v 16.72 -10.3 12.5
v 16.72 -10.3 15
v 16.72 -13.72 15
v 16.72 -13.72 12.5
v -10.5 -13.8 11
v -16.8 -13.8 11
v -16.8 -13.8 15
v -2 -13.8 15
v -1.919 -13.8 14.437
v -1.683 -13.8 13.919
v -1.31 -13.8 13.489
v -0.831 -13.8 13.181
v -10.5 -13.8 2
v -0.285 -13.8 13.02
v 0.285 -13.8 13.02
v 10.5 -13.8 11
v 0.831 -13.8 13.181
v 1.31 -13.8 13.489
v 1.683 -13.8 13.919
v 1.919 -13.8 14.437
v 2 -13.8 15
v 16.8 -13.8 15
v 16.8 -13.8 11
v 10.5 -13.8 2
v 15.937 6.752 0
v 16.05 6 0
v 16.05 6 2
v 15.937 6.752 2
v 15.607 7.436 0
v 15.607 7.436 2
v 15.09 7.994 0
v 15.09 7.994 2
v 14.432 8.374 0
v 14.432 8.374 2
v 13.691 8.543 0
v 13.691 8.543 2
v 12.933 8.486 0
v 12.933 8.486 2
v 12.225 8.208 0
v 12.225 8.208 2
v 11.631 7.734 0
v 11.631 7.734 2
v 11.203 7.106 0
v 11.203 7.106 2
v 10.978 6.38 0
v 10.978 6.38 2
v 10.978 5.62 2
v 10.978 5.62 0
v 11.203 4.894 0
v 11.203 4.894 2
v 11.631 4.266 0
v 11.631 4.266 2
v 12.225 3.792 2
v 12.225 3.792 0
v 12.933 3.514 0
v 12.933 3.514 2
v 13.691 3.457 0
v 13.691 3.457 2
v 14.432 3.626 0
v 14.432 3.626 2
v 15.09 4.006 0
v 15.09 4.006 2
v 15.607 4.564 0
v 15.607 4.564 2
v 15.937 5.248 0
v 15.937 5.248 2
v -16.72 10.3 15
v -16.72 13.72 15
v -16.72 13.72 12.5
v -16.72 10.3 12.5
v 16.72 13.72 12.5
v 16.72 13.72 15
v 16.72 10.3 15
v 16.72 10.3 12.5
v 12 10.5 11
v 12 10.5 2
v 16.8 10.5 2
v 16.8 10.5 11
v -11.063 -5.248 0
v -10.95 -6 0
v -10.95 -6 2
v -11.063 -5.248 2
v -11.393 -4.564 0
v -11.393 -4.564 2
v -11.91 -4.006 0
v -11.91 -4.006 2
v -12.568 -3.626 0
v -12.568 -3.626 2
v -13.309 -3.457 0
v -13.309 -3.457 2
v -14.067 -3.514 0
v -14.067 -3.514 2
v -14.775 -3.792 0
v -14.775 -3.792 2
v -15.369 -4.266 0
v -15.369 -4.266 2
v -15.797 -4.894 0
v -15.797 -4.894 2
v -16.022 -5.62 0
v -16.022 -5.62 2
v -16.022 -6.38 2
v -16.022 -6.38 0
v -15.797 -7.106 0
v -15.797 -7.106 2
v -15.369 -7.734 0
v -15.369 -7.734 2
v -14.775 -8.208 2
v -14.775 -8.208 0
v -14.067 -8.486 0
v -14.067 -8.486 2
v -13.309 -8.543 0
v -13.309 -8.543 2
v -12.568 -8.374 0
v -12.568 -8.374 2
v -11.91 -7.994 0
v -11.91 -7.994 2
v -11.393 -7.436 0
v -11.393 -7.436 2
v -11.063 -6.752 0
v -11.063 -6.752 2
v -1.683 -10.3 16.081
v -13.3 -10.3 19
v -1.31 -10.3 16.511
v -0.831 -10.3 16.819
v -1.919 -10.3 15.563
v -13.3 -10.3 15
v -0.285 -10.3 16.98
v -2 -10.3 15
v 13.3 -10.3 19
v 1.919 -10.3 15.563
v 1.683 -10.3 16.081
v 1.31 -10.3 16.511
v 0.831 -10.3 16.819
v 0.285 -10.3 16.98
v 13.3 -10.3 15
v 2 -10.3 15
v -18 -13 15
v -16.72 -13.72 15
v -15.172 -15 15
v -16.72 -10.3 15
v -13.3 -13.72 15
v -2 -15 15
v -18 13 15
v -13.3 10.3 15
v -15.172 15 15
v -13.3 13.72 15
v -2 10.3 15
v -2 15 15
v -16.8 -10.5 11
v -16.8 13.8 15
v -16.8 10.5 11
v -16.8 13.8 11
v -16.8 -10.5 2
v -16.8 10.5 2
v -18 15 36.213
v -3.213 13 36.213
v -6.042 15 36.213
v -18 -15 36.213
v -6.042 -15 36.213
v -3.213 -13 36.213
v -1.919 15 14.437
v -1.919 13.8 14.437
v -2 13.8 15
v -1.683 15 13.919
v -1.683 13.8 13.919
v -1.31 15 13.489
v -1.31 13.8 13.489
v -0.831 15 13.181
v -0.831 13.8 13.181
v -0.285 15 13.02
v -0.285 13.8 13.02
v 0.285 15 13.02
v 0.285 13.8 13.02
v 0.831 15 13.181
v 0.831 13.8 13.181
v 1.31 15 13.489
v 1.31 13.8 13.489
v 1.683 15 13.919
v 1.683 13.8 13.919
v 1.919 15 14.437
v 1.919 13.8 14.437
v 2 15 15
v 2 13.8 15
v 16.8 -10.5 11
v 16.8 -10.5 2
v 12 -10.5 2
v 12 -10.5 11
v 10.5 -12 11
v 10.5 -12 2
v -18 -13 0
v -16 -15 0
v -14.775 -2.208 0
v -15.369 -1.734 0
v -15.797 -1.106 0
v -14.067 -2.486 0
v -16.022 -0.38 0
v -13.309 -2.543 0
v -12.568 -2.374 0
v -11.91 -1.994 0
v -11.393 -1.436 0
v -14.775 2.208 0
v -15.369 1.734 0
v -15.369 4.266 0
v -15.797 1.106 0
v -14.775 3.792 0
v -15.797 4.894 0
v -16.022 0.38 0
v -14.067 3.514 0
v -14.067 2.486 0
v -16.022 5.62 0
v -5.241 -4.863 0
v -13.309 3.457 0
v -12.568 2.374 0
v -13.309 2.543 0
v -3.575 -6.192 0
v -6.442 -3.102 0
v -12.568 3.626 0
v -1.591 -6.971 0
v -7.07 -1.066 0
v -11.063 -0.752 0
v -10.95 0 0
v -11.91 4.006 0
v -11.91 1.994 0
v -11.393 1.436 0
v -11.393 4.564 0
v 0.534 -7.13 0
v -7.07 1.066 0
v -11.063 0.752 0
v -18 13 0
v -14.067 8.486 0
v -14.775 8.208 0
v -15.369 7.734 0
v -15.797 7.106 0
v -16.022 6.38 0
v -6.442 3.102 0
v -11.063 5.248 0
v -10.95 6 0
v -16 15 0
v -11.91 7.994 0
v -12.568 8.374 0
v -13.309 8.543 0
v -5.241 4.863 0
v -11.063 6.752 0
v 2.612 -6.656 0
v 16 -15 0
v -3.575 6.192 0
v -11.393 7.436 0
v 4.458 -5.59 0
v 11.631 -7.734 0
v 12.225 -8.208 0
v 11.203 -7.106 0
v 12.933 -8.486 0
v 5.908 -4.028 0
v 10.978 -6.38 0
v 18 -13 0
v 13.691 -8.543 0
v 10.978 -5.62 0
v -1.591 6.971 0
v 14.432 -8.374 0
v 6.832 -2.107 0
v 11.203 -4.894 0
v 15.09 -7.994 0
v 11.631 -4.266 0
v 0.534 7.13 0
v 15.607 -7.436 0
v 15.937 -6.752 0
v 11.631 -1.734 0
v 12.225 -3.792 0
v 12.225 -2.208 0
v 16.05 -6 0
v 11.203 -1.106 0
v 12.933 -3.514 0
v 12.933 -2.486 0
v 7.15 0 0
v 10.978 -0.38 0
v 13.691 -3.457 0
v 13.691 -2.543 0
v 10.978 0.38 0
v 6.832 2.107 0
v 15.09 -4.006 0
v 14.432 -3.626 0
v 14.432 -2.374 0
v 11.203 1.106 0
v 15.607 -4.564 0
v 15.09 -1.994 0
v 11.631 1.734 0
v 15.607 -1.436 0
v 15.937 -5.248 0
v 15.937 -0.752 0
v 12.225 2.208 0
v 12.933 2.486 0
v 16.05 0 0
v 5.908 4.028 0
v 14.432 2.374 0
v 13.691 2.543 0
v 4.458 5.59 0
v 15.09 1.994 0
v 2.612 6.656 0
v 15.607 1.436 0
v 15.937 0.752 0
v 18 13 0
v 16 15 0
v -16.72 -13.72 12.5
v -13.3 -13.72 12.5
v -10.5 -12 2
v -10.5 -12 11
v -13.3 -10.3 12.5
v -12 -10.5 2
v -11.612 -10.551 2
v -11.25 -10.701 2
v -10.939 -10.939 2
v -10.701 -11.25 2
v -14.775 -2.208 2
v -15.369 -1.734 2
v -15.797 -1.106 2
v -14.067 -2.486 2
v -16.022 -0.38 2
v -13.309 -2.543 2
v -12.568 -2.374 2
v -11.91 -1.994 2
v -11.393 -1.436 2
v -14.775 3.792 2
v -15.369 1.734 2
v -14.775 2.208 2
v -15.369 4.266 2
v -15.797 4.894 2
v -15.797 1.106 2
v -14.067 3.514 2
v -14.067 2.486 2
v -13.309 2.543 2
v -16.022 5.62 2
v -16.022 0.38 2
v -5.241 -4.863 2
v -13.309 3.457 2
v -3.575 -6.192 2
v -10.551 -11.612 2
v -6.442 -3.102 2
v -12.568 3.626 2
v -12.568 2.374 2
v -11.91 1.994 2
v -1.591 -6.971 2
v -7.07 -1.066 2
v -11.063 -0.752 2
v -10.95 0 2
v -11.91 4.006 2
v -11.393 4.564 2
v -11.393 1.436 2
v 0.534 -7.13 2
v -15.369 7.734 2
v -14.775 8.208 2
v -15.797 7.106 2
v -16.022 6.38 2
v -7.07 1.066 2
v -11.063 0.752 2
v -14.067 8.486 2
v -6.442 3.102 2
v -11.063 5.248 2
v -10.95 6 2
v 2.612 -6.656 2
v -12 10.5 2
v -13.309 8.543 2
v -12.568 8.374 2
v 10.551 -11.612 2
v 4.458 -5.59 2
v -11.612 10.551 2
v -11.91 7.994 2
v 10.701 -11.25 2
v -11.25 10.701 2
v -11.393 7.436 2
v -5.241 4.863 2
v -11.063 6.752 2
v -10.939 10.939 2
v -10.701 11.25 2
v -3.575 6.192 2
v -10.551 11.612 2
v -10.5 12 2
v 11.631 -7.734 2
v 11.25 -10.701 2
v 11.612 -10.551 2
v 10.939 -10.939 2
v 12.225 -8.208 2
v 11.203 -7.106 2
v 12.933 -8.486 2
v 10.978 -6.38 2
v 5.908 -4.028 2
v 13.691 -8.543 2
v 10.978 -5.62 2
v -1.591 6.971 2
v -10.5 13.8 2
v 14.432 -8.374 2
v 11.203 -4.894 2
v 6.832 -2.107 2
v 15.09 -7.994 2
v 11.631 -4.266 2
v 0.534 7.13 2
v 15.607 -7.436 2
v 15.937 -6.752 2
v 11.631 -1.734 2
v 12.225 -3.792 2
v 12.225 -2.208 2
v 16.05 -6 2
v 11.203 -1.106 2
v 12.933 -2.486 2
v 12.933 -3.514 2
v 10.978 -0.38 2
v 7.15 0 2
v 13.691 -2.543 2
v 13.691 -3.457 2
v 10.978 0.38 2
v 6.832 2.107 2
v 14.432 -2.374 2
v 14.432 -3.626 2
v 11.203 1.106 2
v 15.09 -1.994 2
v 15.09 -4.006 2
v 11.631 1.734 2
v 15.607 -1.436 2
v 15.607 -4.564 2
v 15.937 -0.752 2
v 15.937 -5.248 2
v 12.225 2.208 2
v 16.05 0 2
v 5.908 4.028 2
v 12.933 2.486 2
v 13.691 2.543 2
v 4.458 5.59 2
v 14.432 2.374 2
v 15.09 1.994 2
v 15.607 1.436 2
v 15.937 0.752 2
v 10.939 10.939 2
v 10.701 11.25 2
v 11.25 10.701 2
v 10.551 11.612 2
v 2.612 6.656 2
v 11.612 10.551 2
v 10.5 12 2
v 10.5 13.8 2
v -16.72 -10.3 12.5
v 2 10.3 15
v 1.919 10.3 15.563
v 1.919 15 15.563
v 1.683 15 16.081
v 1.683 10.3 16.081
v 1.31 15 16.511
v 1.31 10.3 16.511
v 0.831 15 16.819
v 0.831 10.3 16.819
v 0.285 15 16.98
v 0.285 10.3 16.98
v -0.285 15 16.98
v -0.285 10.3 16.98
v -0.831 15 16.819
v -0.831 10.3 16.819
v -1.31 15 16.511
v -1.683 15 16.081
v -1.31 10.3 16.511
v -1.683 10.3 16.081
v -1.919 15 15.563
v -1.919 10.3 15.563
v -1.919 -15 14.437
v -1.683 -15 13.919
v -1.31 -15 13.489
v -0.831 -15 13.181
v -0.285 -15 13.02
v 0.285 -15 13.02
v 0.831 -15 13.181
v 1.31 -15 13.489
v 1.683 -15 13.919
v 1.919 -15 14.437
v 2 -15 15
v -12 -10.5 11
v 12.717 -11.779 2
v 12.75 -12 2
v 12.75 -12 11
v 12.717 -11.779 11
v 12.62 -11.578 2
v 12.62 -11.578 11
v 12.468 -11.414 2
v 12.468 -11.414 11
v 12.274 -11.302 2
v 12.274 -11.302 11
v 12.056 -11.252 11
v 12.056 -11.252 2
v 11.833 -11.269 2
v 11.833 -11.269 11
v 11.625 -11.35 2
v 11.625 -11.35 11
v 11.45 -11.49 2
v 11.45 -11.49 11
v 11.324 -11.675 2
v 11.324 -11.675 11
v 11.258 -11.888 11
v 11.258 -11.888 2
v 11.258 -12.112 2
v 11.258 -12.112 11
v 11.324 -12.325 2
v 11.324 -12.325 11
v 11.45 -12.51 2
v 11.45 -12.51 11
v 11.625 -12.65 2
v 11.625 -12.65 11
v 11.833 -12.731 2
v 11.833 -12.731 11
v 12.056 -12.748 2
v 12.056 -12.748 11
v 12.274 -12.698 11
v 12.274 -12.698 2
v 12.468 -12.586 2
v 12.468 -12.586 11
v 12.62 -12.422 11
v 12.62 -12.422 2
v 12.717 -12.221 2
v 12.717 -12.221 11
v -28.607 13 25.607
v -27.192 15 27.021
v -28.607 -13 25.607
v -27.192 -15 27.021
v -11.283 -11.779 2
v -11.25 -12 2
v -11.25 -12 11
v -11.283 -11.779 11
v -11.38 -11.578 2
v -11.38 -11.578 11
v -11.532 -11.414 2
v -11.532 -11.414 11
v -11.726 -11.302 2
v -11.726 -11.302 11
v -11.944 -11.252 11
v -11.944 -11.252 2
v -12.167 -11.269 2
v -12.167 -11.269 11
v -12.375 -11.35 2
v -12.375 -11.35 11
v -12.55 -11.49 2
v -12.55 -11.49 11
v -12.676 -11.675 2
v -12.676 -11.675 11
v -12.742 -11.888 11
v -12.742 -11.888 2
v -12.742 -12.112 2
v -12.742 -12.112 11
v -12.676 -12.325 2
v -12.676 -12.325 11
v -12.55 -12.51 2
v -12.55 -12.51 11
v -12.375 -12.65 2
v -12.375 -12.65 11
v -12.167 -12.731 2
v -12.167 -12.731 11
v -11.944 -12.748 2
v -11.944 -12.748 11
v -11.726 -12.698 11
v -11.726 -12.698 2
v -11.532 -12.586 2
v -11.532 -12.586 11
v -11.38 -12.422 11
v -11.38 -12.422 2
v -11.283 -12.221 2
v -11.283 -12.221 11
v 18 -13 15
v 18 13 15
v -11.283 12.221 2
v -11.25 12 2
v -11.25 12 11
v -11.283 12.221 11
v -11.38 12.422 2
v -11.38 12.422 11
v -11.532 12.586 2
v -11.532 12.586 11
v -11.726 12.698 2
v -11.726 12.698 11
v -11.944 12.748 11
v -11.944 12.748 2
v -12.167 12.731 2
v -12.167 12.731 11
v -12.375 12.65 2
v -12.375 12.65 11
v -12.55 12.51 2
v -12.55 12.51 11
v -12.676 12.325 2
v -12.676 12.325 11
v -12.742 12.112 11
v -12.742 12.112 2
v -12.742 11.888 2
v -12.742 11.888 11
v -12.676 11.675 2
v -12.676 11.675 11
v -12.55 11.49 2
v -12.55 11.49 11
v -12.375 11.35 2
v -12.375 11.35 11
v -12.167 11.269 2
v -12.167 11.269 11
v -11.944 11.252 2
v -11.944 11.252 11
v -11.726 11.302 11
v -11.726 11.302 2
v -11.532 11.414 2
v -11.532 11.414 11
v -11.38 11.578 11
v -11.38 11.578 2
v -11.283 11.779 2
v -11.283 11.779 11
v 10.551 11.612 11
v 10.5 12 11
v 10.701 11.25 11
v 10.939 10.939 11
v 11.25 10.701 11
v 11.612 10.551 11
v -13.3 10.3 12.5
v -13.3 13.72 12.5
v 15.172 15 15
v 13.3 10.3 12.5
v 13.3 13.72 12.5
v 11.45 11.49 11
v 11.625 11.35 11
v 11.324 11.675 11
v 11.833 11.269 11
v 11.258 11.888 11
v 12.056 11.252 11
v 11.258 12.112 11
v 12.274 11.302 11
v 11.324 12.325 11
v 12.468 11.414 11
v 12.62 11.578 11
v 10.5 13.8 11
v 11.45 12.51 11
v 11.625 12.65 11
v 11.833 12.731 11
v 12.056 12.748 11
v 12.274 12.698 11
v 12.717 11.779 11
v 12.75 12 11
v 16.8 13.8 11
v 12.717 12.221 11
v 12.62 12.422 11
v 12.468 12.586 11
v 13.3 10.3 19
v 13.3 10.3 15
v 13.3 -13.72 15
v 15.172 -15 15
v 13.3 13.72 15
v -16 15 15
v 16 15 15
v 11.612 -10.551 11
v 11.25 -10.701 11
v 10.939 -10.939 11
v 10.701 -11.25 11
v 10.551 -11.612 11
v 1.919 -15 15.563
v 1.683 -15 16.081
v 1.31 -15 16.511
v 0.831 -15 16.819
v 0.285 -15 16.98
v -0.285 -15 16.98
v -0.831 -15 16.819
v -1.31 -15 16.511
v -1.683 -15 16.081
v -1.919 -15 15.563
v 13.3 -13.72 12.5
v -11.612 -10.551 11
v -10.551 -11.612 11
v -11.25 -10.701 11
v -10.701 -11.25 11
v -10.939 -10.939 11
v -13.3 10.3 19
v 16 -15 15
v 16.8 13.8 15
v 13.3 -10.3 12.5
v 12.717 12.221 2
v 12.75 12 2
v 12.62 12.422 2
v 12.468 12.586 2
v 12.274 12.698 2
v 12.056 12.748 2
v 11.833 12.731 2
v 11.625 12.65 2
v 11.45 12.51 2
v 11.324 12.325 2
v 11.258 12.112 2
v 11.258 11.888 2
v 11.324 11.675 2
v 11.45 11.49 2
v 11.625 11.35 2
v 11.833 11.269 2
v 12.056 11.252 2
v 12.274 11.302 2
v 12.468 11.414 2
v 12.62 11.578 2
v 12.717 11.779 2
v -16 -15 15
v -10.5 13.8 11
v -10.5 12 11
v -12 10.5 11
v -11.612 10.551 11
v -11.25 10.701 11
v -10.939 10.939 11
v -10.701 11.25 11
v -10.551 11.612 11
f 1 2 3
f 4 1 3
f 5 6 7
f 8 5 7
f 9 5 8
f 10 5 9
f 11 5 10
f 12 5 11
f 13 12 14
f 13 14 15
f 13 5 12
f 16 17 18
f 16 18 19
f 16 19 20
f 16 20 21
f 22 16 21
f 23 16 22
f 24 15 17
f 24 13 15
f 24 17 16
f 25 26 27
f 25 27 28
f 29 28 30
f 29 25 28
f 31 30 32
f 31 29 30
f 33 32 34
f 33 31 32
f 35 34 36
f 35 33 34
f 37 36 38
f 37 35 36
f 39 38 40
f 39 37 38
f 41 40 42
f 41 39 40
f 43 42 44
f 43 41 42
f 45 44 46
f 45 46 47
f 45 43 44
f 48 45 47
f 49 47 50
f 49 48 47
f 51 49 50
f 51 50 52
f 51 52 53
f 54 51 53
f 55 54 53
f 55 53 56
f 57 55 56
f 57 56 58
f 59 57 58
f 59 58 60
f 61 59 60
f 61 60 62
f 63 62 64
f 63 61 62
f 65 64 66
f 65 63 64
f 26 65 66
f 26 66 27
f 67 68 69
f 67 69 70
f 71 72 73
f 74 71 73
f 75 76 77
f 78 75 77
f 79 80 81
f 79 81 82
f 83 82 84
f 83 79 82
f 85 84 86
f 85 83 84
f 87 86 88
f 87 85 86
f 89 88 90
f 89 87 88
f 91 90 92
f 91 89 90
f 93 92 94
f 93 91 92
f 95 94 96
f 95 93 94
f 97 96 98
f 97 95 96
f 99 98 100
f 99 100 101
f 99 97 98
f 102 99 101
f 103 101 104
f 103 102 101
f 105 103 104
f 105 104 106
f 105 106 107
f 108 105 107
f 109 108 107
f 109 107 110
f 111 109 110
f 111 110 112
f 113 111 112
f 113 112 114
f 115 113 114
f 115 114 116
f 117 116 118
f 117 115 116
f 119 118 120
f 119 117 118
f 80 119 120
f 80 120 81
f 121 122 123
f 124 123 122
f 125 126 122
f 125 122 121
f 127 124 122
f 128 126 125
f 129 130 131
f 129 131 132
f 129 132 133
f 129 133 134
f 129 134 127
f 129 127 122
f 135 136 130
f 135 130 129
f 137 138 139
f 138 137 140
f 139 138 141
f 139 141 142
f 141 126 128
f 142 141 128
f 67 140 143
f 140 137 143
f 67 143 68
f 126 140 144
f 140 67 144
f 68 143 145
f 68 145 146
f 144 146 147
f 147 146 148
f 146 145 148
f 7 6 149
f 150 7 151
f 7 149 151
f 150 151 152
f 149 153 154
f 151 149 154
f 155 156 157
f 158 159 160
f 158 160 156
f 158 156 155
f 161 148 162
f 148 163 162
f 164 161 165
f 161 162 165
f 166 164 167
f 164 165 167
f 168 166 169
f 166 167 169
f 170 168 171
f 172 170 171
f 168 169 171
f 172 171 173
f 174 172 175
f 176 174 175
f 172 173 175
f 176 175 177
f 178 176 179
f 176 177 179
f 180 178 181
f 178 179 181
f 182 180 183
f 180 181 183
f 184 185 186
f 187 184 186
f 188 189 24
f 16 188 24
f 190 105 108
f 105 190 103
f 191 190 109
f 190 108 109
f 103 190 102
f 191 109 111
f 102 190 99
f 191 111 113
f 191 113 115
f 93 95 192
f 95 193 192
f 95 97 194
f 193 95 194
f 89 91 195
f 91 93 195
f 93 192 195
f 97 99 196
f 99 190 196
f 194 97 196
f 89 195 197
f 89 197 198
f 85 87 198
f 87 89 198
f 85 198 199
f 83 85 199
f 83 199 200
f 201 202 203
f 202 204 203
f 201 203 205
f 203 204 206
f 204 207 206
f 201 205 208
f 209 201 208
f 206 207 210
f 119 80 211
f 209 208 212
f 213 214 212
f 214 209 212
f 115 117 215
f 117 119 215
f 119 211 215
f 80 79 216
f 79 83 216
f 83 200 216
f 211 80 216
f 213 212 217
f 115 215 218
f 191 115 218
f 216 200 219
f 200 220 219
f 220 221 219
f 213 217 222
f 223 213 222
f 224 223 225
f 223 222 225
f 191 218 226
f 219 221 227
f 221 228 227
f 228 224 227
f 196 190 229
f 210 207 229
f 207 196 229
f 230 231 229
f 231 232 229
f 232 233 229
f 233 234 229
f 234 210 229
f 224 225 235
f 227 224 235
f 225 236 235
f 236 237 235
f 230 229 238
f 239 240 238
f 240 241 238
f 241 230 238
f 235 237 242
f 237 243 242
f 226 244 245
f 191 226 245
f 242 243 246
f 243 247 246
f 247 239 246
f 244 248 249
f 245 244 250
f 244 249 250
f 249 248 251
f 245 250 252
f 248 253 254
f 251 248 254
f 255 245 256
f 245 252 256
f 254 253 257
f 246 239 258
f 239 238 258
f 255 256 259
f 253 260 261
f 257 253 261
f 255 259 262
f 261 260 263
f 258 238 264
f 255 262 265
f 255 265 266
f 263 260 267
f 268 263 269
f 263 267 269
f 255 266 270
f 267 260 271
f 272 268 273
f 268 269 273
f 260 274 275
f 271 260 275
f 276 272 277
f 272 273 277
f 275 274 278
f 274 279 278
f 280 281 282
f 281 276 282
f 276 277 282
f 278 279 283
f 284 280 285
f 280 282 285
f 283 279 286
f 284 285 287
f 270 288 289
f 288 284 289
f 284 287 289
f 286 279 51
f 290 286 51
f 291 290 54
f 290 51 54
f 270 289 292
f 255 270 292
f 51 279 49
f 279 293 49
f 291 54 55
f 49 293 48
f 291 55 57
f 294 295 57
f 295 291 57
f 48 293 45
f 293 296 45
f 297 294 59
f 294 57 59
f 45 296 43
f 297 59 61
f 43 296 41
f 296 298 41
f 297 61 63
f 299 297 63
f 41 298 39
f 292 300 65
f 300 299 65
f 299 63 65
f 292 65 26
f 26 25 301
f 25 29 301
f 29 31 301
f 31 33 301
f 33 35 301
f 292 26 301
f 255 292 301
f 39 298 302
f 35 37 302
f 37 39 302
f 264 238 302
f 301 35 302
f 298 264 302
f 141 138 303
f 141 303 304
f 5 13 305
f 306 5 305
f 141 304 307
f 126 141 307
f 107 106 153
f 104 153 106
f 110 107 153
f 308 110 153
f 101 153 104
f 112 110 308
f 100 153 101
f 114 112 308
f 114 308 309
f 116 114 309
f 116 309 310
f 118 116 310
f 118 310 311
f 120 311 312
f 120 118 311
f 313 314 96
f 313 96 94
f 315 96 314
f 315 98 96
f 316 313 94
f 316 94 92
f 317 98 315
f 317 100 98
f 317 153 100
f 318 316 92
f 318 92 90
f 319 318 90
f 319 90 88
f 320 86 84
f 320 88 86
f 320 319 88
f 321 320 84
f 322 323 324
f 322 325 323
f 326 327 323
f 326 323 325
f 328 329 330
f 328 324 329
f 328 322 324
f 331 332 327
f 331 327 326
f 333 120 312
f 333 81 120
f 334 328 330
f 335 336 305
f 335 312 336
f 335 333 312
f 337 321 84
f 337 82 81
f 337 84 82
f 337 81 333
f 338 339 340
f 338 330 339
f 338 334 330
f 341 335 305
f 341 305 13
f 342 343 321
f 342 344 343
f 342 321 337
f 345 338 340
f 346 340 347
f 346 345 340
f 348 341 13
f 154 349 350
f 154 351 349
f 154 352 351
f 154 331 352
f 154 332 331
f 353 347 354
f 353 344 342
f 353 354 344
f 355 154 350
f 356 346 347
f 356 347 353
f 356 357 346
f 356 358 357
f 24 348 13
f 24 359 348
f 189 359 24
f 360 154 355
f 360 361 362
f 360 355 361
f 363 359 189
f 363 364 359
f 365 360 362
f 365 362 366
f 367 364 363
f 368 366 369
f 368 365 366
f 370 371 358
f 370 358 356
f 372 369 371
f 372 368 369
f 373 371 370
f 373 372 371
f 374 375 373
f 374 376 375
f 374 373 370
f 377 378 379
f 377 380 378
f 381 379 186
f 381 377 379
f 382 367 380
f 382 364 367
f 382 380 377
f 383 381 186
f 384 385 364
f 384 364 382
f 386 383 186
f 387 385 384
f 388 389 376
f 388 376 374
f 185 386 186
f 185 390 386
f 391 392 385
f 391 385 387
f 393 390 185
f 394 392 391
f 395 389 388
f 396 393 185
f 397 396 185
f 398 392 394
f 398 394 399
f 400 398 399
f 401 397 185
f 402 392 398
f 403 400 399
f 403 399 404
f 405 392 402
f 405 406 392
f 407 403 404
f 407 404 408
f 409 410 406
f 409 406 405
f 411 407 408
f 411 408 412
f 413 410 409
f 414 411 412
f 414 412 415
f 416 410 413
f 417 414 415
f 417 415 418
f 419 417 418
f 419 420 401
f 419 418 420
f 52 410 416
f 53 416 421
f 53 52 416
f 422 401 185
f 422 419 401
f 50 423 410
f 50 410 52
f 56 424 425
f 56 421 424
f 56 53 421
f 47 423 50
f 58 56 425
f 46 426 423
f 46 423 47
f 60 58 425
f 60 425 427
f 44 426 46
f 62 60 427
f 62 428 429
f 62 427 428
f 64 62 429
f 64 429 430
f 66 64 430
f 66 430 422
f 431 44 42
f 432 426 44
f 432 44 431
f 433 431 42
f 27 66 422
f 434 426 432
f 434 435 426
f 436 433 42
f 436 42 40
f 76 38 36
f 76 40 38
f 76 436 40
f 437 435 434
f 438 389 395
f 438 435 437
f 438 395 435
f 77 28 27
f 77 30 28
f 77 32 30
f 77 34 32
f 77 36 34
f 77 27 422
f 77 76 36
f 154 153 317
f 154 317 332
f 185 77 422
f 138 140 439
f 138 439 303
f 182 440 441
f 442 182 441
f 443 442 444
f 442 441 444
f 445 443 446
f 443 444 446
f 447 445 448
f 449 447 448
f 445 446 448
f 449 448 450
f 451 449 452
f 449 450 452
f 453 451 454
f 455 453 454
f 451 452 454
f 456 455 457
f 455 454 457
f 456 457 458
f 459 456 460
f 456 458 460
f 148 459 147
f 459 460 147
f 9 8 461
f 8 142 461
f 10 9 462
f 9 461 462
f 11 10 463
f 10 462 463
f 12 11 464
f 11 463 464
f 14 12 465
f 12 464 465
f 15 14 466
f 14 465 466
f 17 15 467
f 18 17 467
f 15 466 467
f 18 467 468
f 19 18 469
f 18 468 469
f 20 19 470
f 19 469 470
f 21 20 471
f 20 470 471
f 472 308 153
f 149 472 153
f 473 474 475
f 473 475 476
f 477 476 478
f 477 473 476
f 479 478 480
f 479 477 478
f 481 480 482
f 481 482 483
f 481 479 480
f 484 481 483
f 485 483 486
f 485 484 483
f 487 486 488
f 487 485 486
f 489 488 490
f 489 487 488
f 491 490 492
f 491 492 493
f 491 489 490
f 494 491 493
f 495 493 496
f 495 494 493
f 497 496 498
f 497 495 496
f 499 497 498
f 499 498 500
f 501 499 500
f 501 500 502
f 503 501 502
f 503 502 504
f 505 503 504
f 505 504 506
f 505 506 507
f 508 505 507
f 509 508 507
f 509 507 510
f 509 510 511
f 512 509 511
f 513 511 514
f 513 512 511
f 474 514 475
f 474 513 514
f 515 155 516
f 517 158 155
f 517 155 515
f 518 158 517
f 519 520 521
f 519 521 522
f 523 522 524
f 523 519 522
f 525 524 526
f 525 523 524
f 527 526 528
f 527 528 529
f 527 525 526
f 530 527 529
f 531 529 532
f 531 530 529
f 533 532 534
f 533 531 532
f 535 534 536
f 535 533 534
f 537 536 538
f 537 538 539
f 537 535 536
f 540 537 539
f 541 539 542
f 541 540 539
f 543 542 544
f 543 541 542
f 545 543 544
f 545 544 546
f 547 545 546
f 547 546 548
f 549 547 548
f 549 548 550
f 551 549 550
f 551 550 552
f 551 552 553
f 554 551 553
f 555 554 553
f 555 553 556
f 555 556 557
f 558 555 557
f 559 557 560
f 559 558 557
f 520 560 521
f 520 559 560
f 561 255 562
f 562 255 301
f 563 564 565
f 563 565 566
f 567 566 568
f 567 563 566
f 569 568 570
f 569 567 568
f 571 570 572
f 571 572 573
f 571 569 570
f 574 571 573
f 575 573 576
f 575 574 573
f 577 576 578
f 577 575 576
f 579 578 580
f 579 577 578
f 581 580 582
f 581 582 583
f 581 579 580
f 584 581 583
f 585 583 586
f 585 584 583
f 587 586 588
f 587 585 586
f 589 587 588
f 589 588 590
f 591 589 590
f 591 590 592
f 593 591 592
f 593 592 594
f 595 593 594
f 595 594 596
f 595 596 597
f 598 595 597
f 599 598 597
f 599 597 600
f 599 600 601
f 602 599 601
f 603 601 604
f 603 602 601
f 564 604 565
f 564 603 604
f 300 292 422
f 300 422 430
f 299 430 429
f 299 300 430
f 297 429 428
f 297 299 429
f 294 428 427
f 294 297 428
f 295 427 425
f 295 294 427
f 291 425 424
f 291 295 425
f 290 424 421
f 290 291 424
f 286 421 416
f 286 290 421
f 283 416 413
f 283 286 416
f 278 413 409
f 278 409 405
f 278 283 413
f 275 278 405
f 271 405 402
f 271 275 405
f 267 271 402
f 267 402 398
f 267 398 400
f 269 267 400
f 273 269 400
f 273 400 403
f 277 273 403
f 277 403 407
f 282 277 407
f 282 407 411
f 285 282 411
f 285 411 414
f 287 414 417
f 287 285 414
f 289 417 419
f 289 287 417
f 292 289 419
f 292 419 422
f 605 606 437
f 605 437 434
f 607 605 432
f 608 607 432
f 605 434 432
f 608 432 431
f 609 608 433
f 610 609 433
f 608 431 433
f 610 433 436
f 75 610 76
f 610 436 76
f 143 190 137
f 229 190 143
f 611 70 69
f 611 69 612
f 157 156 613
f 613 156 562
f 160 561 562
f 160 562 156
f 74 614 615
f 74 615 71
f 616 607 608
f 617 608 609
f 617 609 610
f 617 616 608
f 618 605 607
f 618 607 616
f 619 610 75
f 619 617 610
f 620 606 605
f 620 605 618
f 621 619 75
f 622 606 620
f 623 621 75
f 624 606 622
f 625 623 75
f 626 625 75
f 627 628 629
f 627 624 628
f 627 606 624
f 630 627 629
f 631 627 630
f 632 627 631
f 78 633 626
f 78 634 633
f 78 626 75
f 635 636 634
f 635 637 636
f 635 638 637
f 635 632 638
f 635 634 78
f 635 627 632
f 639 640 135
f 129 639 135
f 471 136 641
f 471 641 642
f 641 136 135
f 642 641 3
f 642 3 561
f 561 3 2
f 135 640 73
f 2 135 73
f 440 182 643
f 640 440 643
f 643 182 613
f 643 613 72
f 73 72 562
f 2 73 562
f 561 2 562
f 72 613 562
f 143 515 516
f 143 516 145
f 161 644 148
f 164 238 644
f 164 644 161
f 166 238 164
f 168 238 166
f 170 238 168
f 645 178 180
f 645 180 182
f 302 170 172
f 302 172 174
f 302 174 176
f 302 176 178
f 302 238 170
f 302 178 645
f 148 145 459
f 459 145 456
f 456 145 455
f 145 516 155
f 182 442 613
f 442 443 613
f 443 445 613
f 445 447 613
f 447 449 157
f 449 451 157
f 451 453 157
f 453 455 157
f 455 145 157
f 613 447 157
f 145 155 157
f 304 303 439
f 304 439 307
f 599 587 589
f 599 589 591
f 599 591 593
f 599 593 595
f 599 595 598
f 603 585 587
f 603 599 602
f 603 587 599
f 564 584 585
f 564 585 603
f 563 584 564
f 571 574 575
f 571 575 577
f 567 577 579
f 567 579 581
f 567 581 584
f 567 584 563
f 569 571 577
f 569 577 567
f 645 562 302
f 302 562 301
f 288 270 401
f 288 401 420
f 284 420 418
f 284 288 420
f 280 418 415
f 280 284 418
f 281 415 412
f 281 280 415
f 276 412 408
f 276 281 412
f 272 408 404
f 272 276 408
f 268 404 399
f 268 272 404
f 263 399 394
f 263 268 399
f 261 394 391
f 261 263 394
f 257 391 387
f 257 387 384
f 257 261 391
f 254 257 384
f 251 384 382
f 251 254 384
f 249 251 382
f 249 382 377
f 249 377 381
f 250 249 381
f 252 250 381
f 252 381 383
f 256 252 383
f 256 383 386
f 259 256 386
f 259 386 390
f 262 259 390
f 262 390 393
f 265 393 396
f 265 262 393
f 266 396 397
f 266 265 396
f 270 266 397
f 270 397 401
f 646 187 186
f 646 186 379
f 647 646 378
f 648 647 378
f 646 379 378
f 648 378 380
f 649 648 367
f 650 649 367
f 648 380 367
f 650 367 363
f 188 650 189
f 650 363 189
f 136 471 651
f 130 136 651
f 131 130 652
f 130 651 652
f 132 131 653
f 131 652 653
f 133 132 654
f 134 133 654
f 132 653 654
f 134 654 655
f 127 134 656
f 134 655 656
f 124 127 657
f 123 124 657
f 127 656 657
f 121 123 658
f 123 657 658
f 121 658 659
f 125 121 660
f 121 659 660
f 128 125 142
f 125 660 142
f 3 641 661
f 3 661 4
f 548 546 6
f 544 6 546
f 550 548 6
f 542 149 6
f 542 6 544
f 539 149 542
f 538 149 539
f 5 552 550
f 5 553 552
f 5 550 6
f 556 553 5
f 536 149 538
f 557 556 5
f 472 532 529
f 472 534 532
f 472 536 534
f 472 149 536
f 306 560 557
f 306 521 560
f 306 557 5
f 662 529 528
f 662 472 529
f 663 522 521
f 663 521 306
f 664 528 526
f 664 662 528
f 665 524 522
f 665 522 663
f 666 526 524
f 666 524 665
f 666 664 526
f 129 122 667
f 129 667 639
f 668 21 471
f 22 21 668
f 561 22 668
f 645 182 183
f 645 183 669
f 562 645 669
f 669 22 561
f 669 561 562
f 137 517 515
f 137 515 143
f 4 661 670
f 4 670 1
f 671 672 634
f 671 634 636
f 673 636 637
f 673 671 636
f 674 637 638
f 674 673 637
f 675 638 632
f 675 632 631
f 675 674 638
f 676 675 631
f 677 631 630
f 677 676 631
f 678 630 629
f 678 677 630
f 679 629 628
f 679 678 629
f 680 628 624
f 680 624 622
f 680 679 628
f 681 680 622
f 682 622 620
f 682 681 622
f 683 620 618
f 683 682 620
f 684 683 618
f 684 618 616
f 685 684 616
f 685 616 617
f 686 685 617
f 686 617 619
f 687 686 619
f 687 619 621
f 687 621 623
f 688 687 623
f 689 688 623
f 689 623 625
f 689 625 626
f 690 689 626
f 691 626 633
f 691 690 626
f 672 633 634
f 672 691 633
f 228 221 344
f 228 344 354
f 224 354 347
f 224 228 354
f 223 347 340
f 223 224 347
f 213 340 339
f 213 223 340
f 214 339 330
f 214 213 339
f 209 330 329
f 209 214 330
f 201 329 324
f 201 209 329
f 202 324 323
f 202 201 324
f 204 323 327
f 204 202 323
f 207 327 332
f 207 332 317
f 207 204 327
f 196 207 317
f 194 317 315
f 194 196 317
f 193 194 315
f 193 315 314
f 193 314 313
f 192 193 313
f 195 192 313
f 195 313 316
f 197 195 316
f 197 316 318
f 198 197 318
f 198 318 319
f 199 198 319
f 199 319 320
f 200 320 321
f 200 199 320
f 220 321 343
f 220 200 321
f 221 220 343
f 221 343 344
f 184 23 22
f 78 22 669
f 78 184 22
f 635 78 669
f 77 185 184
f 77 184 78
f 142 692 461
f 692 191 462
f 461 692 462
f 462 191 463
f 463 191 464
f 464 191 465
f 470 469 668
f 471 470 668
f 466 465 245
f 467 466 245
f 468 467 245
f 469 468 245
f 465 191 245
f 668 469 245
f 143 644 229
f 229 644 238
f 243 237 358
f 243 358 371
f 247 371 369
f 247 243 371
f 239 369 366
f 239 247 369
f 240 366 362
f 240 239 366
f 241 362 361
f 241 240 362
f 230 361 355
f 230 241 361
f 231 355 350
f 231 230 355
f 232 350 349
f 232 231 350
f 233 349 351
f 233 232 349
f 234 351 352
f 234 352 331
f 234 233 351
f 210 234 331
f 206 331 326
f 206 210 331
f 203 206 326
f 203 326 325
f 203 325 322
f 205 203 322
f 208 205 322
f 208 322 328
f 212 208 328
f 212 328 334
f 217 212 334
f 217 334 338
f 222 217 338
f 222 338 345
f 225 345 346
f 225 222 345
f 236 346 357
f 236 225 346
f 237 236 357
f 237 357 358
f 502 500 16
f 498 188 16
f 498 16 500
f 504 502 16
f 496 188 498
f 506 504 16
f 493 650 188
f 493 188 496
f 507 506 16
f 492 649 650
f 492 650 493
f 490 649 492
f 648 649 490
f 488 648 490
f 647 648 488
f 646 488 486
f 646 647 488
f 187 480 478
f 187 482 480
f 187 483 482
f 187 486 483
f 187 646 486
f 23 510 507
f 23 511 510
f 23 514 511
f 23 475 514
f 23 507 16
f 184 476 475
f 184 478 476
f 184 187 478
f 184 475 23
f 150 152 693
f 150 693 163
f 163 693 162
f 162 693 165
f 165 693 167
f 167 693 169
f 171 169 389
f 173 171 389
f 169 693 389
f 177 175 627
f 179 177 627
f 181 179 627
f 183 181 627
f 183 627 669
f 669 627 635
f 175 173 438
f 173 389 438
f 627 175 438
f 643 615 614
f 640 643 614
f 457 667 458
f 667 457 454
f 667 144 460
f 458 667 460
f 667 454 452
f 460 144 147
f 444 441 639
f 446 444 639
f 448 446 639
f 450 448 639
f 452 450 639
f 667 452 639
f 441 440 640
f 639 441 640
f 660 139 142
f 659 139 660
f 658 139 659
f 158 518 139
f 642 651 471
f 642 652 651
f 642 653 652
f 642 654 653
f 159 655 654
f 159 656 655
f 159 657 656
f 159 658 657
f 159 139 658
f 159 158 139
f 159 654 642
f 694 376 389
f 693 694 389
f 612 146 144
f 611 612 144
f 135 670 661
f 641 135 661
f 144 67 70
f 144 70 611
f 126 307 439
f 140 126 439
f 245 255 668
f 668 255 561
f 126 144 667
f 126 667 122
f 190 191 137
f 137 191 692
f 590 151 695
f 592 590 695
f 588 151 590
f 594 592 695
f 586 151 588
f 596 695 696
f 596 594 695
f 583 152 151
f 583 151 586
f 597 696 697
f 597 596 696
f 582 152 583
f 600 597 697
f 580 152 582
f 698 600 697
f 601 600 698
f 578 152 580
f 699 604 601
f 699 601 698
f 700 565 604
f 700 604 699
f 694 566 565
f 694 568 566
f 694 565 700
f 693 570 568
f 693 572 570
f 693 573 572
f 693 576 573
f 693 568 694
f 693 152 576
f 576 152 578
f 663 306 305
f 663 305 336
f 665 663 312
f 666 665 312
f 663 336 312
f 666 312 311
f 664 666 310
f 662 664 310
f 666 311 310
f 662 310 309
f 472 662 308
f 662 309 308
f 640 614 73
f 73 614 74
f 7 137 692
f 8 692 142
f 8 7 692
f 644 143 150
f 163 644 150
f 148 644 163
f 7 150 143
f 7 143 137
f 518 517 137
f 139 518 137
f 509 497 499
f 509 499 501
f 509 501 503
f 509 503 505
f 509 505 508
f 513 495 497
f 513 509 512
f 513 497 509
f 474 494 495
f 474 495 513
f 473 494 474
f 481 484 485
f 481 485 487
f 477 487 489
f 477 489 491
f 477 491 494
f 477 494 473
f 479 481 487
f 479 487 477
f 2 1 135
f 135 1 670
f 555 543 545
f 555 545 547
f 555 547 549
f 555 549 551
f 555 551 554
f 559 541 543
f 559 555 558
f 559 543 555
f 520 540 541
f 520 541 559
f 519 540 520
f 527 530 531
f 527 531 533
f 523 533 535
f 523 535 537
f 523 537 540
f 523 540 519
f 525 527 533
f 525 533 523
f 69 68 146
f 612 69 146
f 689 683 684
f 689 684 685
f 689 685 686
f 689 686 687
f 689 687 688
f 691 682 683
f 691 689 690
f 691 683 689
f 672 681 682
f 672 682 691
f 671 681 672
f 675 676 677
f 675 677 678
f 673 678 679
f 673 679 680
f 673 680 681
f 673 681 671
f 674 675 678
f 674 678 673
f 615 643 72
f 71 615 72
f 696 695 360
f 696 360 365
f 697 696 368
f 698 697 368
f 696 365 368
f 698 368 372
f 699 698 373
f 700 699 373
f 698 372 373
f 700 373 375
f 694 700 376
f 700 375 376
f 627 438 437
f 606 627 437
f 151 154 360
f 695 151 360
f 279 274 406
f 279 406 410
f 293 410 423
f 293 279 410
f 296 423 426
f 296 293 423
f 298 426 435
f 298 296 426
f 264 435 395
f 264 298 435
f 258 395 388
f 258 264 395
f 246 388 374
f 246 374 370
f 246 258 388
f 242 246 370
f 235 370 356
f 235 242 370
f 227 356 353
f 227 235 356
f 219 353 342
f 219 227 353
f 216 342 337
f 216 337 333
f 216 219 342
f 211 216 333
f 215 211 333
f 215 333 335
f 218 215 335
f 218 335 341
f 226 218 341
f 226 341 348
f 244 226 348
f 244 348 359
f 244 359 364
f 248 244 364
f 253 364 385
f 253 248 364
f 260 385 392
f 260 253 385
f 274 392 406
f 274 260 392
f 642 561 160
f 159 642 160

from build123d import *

# Parameters (mm, degrees)
F1_W       = 36
F1_H       = 30
F1_R       = 2.55
F1_R_2     = 7.15
F2_DEPTH   = 2
F3_W       = 36
F3_H       = 30
F3_R       = 0.75
F4_DEPTH   = 9
F5_W       = 36
F5_H       = 30
F5_W_2     = 33.6
F5_H_2     = 27.6
F6_DEPTH   = 4
F7_W       = 36
F7_H       = 30
F8_DEPTH   = 4
F9_W       = 3.42
F9_H       = 3.42
F10_DEPTH  = 2.5
F11_W      = 36
F11_H      = 30
F12_DEPTH  = 2
F14_DEPTH  = 15
F16_DEPTH  = 18
F17_W      = 26.6
F17_H      = 20.6
F18_DEPTH  = 4
F19_R      = 2
F20_DEPTH  = 1000
F21_SIZE   = 2
F21_2_SIZE = 2


# Not quite as in the source:
# - a feature names something its author has since deleted; it is built from what else it names


with BuildPart() as f2:
    # F1 (on Top) → F2 (new body)
    with BuildSketch(Plane.XY):
        Rectangle(F1_W, F1_H)
        with Locations((-13.5, -6)):
            Circle(F1_R, mode=Mode.SUBTRACT)
        with Locations((13.5, -6)):
            Circle(F1_R, mode=Mode.SUBTRACT)
        with Locations((-13.5, 0)):
            Circle(F1_R, mode=Mode.SUBTRACT)
        with Locations((-13.5, 6)):
            Circle(F1_R, mode=Mode.SUBTRACT)
        Circle(F1_R_2, mode=Mode.SUBTRACT)
        with Locations((13.5, 0)):
            Circle(F1_R, mode=Mode.SUBTRACT)
        with Locations((13.5, 6)):
            Circle(F1_R, mode=Mode.SUBTRACT)
    extrude(amount=F2_DEPTH)

    # F3 (on face) → F4 (join)
    with BuildSketch(Plane.XY.offset(2)):
        Rectangle(F3_W, F3_H)
        with Locations((-12, -12)):
            Circle(F3_R, mode=Mode.SUBTRACT)
        with Locations((12, -12)):
            Circle(F3_R, mode=Mode.SUBTRACT)
        with Locations((-12, 12)):
            Circle(F3_R, mode=Mode.SUBTRACT)
        with BuildLine():
            Line((-16.8, 10.5), (-12, 10.5))
            ThreePointArc((-12, 10.5), (-10.9393398282, 10.9393398282), (-10.5, 12))
            Line((-10.5, 12), (-10.5, 13.8))
            Line((-10.5, 13.8), (10.5, 13.8))
            Line((10.5, 13.8), (10.5, 12))
            ThreePointArc((10.5, 12), (10.9393398282, 10.9393398282), (12, 10.5))
            Line((12, 10.5), (16.8, 10.5))
            Line((16.8, 10.5), (16.8, -10.5))
            Line((16.8, -10.5), (12, -10.5))
            ThreePointArc((12, -10.5), (10.9393398282, -10.9393398282), (10.5, -12))
            Line((10.5, -12), (10.5, -13.8))
            Line((10.5, -13.8), (-10.5, -13.8))
            Line((-10.5, -13.8), (-10.5, -12))
            ThreePointArc((-10.5, -12), (-10.9393398282, -10.9393398282), (-12, -10.5))
            Line((-12, -10.5), (-16.8, -10.5))
            Line((-16.8, -10.5), (-16.8, 10.5))
        make_face(mode=Mode.SUBTRACT)
        with Locations((12, 12)):
            Circle(F3_R, mode=Mode.SUBTRACT)
    extrude(amount=F4_DEPTH)

    # F5 (on face) → F6 (join)
    with BuildSketch(Plane.XY.offset(11)):
        Rectangle(F5_W, F5_H)
        Rectangle(F5_W_2, F5_H_2, mode=Mode.SUBTRACT)
    extrude(amount=F6_DEPTH)


with BuildPart() as f8:
    # F7 (on face) → F8 (new body)
    with BuildSketch(Plane.XY.offset(15)):
        Rectangle(F7_W, F7_H)
        Polygon((-16.8, -10.3), (-16.8, 10.3), (-13.3, 10.3), (-13.3, 13.8), (13.3, 13.8), (13.3, 10.3), (16.8, 10.3), (16.8, -10.3), (13.3, -10.3), (13.3, -13.8), (-13.3, -13.8), (-13.3, -10.3), align=None, mode=Mode.SUBTRACT)
    extrude(amount=F8_DEPTH)

    # F9 (on face) → F10 (join)
    with BuildSketch(Plane(origin=(0, 0, 15), x_dir=(1, 0, 0), z_dir=(0, 0, -1))):
        with Locations((-15.01, -12.01)):
            Rectangle(F9_W, F9_H)
        with Locations((15.01, -12.01)):
            Rectangle(F9_W, F9_H)
        with Locations((-15.01, 12.01)):
            Rectangle(F9_W, F9_H)
        with Locations((15.01, 12.01)):
            Rectangle(F9_W, F9_H)
    extrude(amount=F10_DEPTH)

    # F11 (on face) → F12 (join)
    with BuildSketch(Plane.XY.offset(19)):
        Rectangle(F11_W, F11_H)
    extrude(amount=F12_DEPTH)

    # F13 (on Front) → F14 (join, symmetric)
    with BuildSketch(Plane.XZ):
        Polygon((-3.2132034356, 36.2132034356), (-18, 36.2132034356), (-28.6066017178, 25.6066017178), (-18, 15), (18, 15), align=None)
    extrude(amount=F14_DEPTH, both=True)

    # F15 (on Front) → F16 (cut, symmetric)
    with BuildSketch(Plane.XZ):
        Polygon((18, 21), (12, 21), (18, 15), align=None)
    extrude(amount=F16_DEPTH, both=True, mode=Mode.SUBTRACT)

    # F17 (on face) → F18 (cut)
    with BuildSketch(Plane(origin=(0, 0, 15), x_dir=(1, 0, 0), z_dir=(0, 0, -1))):
        Rectangle(F17_W, F17_H)
    extrude(amount=-F18_DEPTH, mode=Mode.SUBTRACT)


with BuildPart() as f20_tool:
    # F19 (on Front) → F20 (new body, symmetric)
    with BuildSketch(Plane.XZ):
        with Locations((0, 15)):
            Circle(F19_R)
    extrude(amount=F20_DEPTH, both=True)


with BuildPart() as f2_1:
    add(f2.part)

    # F20: cut by f20_tool
    add(f20_tool.part, mode=Mode.SUBTRACT)

    # F21
    f21_edges = [f2_1.edges().sort_by_distance(p)[0] for p in [
        (-18, 15, 7.5),
        (-18, -15, 7.5),
        (18, -15, 7.5),
        (18, 15, 7.5),
    ]]
    chamfer(f21_edges, length=F21_SIZE)


with BuildPart() as f8_1:
    add(f8.part)

    # F20: cut by f20_tool
    add(f20_tool.part, mode=Mode.SUBTRACT)

    # F21#2
    f21_2_edges = [f8_1.edges().sort_by_distance(p)[0] for p in [
        (-23.303301, -15, 20.303301),
        (-23.303301, 15, 20.303301),
        (7.393398, 15, 25.606602),
        (7.393398, -15, 25.606602),
    ]]
    chamfer(f21_2_edges, length=F21_2_SIZE)


solid = Compound([f2_1.part, f8_1.part])
